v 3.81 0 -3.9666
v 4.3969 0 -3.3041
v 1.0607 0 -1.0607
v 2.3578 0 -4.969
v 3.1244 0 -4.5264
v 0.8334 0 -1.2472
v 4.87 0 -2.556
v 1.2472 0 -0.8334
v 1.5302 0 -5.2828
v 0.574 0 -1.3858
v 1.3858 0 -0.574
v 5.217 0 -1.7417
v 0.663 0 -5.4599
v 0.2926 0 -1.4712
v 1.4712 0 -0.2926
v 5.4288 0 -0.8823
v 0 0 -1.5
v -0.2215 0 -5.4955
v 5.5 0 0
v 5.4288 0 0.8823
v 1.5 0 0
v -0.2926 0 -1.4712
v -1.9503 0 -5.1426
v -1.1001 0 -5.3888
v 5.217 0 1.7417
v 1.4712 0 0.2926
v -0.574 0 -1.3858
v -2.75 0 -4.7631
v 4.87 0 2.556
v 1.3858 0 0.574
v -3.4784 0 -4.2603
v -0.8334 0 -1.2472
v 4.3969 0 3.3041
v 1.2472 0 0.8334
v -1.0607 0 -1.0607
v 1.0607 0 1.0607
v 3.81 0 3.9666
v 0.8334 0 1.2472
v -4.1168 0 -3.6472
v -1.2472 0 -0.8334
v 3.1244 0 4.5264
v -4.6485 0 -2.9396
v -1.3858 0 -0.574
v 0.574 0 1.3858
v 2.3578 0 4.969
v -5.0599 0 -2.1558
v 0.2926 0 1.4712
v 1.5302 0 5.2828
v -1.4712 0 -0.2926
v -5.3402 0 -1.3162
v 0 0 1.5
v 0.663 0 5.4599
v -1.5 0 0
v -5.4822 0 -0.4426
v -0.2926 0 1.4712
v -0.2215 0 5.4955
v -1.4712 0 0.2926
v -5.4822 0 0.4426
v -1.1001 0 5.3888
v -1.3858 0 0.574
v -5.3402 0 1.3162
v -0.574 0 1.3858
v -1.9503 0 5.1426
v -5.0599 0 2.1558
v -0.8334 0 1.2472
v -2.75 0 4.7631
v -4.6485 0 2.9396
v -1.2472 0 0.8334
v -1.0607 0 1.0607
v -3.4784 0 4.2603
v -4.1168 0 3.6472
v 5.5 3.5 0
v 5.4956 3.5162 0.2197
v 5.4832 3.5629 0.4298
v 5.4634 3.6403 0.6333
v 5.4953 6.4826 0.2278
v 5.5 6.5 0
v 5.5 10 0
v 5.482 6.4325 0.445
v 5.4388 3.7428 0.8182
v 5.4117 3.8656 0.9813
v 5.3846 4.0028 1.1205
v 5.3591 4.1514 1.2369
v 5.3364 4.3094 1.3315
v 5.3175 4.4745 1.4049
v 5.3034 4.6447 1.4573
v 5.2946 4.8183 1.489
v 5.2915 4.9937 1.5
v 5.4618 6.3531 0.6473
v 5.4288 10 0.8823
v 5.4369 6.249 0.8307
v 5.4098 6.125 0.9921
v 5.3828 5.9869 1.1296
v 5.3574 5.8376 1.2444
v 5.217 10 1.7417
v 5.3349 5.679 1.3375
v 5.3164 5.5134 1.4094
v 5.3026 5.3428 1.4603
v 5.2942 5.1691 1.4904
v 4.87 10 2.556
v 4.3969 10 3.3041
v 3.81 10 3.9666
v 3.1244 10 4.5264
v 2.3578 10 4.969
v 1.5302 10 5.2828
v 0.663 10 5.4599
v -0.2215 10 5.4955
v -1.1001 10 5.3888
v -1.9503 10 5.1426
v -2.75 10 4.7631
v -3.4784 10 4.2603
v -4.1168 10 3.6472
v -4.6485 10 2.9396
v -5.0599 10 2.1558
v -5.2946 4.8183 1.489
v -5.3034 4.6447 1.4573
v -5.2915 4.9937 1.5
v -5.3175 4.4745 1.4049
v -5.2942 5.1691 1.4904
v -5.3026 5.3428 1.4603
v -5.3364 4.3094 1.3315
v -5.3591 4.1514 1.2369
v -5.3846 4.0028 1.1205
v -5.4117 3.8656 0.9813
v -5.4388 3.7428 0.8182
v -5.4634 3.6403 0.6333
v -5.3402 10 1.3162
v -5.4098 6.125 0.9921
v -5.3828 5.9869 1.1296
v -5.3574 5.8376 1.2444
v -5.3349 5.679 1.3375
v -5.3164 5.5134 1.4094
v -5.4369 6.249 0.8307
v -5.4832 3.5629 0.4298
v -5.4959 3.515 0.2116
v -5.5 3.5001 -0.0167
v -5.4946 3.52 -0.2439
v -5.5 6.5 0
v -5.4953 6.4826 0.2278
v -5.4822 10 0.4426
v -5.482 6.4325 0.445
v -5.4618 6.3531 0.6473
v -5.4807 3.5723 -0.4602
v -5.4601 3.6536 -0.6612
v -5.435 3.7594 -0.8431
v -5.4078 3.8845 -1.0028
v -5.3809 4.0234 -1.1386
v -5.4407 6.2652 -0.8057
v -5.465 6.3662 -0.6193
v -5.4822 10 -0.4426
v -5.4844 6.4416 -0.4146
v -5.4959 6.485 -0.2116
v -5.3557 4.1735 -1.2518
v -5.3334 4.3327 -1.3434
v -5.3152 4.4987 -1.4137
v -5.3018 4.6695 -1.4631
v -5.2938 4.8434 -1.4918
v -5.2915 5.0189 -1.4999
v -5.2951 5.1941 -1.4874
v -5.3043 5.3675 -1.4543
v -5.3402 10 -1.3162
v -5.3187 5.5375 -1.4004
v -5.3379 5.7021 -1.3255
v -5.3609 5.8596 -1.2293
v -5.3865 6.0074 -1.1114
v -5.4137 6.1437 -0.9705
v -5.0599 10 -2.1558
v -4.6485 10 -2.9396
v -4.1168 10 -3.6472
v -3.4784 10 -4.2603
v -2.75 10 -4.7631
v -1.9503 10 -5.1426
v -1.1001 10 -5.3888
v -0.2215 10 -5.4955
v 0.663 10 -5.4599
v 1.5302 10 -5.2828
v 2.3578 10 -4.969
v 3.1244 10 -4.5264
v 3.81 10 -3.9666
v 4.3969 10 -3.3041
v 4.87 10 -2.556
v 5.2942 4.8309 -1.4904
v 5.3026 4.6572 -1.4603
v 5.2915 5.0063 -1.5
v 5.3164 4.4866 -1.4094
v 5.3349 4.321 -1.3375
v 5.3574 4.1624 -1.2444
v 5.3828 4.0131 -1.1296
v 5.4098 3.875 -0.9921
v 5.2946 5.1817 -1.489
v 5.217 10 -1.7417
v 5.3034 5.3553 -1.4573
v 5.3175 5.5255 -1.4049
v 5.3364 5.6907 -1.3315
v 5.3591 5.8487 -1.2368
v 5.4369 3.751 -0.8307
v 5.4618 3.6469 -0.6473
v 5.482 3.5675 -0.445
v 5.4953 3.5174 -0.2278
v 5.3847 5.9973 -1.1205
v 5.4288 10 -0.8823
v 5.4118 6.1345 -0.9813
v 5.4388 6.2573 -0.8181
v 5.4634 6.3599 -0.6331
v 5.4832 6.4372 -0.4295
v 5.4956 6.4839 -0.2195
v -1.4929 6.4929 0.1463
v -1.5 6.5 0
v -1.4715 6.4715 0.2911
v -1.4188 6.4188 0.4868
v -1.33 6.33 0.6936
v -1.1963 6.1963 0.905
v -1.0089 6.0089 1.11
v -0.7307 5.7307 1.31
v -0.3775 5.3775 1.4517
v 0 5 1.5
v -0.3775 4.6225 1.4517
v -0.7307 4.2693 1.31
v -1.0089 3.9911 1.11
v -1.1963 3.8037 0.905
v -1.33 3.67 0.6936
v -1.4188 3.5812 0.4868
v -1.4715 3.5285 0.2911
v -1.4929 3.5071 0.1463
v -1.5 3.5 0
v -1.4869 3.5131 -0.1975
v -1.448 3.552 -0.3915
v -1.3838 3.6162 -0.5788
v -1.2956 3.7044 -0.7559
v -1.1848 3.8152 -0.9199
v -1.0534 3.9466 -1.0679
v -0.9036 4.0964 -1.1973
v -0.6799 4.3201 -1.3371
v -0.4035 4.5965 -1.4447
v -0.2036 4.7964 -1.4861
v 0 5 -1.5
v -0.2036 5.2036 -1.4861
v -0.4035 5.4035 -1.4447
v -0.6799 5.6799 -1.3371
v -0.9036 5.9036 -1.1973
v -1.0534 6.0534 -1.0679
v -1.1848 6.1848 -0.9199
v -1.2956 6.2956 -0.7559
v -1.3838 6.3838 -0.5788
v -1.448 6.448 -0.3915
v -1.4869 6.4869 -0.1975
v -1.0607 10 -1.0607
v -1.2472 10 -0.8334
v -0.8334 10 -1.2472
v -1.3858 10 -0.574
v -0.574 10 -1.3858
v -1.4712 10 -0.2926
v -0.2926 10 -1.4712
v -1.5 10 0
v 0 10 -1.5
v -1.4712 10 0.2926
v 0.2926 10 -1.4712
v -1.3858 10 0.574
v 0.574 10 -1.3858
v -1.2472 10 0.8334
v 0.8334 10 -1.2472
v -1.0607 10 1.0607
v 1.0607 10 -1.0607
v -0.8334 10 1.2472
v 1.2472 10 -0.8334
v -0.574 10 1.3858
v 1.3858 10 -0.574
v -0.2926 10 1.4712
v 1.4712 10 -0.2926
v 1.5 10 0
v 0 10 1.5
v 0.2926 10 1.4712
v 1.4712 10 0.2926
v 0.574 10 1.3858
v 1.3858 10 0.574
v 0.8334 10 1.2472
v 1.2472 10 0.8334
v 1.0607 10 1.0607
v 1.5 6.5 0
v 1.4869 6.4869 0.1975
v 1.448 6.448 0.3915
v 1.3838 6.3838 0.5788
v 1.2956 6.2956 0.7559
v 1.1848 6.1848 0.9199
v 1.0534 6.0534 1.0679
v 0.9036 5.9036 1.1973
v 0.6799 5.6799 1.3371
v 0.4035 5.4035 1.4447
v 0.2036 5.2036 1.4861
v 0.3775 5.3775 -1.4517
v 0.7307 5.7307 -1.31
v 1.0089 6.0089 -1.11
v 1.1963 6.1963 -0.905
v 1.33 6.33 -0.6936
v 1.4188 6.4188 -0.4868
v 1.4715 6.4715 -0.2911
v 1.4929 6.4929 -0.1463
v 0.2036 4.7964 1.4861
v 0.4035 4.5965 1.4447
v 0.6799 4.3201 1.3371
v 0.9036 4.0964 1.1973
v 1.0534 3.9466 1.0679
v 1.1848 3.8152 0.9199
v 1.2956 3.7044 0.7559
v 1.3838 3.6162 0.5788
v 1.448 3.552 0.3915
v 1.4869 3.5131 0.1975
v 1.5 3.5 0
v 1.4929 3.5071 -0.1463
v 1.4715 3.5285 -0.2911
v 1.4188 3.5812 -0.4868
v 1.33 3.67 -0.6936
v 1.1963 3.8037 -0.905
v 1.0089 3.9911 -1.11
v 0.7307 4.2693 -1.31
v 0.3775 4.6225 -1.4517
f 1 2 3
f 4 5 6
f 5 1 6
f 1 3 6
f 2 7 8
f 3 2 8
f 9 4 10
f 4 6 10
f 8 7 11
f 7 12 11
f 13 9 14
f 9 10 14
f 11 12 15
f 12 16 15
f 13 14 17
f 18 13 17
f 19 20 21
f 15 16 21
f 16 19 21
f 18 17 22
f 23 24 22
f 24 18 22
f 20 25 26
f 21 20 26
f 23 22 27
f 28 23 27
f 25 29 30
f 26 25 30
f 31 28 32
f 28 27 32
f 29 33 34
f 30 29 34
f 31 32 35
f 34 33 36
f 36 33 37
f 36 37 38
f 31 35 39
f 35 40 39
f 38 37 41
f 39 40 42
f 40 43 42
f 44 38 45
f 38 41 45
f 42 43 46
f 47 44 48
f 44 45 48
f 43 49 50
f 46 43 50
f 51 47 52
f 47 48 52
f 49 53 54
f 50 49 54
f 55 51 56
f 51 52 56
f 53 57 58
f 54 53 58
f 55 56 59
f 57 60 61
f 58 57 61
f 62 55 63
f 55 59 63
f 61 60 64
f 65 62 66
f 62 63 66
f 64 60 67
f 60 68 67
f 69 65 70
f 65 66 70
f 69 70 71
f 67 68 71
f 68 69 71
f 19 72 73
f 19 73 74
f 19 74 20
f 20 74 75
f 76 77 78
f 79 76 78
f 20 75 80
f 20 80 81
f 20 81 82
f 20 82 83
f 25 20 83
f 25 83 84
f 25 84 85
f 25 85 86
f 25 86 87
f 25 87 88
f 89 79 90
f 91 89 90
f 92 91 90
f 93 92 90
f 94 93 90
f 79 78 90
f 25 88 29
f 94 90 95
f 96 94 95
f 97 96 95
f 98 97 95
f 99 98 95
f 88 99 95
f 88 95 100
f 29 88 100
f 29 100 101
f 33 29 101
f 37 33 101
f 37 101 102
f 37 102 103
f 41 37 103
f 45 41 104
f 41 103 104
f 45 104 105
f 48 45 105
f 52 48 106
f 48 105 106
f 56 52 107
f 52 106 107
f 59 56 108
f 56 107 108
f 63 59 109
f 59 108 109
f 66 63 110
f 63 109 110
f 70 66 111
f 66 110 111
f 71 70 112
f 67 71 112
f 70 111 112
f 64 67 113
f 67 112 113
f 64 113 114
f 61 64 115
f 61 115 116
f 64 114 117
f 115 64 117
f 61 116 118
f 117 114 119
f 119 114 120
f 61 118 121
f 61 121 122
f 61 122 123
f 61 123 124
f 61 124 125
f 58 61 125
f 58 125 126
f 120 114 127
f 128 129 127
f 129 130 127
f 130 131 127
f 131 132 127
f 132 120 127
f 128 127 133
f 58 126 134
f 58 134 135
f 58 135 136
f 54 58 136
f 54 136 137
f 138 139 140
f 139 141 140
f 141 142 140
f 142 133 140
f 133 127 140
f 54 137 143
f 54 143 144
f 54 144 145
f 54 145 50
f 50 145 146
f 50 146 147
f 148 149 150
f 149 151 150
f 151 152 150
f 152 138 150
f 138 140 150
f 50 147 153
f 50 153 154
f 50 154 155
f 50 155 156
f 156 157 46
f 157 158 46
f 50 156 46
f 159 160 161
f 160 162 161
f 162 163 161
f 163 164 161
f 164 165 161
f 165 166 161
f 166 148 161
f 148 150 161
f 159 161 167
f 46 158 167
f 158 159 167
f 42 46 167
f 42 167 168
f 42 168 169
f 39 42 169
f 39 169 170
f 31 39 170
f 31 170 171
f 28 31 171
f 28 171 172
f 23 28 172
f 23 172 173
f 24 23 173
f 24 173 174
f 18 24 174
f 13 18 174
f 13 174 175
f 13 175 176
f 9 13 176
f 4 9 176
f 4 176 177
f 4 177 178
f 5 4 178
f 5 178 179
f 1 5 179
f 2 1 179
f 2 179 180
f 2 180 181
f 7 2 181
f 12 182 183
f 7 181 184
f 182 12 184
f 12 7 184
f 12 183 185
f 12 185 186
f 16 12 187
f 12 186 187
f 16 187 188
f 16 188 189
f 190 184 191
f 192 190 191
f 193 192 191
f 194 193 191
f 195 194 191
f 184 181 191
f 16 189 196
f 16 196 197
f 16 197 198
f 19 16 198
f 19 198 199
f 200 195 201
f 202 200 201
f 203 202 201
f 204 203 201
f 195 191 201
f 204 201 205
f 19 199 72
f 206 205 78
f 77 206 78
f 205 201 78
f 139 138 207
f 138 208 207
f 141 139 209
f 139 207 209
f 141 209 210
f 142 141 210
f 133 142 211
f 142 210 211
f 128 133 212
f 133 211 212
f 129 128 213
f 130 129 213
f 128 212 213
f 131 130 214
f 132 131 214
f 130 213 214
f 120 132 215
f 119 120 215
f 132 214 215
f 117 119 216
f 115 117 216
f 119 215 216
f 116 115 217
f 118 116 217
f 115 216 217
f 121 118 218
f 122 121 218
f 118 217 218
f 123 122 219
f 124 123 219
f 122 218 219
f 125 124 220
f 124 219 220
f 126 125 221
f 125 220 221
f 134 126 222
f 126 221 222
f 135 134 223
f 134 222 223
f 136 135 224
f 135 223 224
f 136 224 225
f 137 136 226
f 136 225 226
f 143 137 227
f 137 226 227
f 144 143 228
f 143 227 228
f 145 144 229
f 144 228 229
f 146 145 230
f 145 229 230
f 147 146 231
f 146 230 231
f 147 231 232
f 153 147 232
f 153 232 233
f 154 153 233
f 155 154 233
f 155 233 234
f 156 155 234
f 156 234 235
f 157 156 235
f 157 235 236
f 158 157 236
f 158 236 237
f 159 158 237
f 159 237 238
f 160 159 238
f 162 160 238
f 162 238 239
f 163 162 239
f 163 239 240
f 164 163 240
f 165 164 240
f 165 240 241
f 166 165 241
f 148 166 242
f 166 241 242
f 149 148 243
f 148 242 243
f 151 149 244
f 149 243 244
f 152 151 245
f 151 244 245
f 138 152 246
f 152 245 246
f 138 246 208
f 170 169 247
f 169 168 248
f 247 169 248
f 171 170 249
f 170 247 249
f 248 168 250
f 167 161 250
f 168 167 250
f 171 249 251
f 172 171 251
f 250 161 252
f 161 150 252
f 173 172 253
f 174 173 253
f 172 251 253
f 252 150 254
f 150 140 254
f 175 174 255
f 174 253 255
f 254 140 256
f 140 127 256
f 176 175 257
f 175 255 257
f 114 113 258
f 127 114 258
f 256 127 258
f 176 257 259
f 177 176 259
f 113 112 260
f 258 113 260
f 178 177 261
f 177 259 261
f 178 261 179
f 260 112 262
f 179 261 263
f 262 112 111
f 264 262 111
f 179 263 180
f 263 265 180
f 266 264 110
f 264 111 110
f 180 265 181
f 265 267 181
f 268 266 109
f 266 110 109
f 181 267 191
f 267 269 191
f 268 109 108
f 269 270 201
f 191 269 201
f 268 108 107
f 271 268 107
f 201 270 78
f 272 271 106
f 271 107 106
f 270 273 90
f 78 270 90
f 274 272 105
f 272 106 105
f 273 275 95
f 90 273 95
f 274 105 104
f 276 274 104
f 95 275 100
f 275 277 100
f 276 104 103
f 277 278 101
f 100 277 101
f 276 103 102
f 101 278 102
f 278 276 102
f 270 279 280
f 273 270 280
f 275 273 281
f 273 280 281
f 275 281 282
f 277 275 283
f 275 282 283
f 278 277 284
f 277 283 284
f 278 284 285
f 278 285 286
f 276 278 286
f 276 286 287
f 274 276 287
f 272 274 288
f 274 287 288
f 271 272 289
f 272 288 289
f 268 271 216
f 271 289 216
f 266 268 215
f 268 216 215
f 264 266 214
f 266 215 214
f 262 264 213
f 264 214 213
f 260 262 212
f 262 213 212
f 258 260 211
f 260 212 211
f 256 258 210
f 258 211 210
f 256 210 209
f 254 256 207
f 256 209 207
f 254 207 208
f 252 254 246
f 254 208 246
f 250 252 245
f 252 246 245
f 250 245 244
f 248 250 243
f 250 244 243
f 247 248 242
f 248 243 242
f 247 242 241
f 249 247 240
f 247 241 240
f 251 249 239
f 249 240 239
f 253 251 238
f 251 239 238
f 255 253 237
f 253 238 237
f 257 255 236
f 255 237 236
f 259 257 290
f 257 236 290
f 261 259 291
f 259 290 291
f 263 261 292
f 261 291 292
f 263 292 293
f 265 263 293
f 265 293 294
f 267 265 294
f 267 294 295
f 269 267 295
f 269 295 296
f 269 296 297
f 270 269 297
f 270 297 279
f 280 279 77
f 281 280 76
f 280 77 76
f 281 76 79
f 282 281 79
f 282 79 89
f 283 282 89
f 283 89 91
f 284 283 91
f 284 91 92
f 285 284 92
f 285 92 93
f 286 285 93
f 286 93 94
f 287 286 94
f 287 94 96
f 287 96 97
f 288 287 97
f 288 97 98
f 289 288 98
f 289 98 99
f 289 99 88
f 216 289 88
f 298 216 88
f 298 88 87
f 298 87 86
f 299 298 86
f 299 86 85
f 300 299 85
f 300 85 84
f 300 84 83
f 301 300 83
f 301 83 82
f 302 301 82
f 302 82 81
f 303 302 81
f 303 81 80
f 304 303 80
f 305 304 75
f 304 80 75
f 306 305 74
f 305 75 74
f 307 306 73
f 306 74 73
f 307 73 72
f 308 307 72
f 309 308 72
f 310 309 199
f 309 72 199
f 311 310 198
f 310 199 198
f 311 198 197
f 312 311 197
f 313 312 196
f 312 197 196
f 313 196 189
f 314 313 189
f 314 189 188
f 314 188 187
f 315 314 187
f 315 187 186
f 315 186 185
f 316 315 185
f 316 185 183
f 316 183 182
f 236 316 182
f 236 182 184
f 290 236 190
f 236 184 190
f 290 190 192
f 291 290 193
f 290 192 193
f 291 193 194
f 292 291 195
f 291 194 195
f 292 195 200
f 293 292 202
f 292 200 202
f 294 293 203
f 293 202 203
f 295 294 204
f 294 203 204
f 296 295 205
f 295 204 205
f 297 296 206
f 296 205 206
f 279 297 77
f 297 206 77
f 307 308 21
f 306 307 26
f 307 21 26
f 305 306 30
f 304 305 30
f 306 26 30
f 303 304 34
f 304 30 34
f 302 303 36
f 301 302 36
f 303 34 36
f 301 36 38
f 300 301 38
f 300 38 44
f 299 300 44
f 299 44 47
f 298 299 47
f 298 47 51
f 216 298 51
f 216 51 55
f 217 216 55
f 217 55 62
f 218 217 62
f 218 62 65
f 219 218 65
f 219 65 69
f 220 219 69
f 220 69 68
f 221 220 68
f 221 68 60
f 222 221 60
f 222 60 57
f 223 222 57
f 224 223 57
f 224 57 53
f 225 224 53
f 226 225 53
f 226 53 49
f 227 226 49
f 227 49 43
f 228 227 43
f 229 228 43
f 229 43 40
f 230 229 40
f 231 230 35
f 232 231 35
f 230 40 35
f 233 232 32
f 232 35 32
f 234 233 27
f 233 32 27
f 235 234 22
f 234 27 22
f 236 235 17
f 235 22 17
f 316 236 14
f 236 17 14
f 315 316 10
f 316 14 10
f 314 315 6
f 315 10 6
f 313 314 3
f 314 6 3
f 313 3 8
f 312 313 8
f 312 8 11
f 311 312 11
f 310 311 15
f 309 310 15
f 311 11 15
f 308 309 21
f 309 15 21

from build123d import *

# Parameters (mm, degrees)
F4_R     = 1.5
F5_DEPTH = 12.5


with BuildPart() as f1:
    # F0 (on Top) → F1 (revolve)
    with BuildSketch(Plane.XY):
        Polygon((1.5, 3.5), (1.5, 0), (5.5, 0), (5.5, 3.5), (5.5, 6.5), (5.5, 10), (1.5, 10), (1.5, 6.5), align=None)
    revolve(axis=Axis((0, 15, 0), (0, -1, 0)))

    # F4 (on Right) → F5 (cut, symmetric)
    with BuildSketch(Plane.YZ):
        with Locations((5, 0)):
            Circle(F4_R)
    extrude(amount=F5_DEPTH, both=True, mode=Mode.SUBTRACT)


solid = f1.part
